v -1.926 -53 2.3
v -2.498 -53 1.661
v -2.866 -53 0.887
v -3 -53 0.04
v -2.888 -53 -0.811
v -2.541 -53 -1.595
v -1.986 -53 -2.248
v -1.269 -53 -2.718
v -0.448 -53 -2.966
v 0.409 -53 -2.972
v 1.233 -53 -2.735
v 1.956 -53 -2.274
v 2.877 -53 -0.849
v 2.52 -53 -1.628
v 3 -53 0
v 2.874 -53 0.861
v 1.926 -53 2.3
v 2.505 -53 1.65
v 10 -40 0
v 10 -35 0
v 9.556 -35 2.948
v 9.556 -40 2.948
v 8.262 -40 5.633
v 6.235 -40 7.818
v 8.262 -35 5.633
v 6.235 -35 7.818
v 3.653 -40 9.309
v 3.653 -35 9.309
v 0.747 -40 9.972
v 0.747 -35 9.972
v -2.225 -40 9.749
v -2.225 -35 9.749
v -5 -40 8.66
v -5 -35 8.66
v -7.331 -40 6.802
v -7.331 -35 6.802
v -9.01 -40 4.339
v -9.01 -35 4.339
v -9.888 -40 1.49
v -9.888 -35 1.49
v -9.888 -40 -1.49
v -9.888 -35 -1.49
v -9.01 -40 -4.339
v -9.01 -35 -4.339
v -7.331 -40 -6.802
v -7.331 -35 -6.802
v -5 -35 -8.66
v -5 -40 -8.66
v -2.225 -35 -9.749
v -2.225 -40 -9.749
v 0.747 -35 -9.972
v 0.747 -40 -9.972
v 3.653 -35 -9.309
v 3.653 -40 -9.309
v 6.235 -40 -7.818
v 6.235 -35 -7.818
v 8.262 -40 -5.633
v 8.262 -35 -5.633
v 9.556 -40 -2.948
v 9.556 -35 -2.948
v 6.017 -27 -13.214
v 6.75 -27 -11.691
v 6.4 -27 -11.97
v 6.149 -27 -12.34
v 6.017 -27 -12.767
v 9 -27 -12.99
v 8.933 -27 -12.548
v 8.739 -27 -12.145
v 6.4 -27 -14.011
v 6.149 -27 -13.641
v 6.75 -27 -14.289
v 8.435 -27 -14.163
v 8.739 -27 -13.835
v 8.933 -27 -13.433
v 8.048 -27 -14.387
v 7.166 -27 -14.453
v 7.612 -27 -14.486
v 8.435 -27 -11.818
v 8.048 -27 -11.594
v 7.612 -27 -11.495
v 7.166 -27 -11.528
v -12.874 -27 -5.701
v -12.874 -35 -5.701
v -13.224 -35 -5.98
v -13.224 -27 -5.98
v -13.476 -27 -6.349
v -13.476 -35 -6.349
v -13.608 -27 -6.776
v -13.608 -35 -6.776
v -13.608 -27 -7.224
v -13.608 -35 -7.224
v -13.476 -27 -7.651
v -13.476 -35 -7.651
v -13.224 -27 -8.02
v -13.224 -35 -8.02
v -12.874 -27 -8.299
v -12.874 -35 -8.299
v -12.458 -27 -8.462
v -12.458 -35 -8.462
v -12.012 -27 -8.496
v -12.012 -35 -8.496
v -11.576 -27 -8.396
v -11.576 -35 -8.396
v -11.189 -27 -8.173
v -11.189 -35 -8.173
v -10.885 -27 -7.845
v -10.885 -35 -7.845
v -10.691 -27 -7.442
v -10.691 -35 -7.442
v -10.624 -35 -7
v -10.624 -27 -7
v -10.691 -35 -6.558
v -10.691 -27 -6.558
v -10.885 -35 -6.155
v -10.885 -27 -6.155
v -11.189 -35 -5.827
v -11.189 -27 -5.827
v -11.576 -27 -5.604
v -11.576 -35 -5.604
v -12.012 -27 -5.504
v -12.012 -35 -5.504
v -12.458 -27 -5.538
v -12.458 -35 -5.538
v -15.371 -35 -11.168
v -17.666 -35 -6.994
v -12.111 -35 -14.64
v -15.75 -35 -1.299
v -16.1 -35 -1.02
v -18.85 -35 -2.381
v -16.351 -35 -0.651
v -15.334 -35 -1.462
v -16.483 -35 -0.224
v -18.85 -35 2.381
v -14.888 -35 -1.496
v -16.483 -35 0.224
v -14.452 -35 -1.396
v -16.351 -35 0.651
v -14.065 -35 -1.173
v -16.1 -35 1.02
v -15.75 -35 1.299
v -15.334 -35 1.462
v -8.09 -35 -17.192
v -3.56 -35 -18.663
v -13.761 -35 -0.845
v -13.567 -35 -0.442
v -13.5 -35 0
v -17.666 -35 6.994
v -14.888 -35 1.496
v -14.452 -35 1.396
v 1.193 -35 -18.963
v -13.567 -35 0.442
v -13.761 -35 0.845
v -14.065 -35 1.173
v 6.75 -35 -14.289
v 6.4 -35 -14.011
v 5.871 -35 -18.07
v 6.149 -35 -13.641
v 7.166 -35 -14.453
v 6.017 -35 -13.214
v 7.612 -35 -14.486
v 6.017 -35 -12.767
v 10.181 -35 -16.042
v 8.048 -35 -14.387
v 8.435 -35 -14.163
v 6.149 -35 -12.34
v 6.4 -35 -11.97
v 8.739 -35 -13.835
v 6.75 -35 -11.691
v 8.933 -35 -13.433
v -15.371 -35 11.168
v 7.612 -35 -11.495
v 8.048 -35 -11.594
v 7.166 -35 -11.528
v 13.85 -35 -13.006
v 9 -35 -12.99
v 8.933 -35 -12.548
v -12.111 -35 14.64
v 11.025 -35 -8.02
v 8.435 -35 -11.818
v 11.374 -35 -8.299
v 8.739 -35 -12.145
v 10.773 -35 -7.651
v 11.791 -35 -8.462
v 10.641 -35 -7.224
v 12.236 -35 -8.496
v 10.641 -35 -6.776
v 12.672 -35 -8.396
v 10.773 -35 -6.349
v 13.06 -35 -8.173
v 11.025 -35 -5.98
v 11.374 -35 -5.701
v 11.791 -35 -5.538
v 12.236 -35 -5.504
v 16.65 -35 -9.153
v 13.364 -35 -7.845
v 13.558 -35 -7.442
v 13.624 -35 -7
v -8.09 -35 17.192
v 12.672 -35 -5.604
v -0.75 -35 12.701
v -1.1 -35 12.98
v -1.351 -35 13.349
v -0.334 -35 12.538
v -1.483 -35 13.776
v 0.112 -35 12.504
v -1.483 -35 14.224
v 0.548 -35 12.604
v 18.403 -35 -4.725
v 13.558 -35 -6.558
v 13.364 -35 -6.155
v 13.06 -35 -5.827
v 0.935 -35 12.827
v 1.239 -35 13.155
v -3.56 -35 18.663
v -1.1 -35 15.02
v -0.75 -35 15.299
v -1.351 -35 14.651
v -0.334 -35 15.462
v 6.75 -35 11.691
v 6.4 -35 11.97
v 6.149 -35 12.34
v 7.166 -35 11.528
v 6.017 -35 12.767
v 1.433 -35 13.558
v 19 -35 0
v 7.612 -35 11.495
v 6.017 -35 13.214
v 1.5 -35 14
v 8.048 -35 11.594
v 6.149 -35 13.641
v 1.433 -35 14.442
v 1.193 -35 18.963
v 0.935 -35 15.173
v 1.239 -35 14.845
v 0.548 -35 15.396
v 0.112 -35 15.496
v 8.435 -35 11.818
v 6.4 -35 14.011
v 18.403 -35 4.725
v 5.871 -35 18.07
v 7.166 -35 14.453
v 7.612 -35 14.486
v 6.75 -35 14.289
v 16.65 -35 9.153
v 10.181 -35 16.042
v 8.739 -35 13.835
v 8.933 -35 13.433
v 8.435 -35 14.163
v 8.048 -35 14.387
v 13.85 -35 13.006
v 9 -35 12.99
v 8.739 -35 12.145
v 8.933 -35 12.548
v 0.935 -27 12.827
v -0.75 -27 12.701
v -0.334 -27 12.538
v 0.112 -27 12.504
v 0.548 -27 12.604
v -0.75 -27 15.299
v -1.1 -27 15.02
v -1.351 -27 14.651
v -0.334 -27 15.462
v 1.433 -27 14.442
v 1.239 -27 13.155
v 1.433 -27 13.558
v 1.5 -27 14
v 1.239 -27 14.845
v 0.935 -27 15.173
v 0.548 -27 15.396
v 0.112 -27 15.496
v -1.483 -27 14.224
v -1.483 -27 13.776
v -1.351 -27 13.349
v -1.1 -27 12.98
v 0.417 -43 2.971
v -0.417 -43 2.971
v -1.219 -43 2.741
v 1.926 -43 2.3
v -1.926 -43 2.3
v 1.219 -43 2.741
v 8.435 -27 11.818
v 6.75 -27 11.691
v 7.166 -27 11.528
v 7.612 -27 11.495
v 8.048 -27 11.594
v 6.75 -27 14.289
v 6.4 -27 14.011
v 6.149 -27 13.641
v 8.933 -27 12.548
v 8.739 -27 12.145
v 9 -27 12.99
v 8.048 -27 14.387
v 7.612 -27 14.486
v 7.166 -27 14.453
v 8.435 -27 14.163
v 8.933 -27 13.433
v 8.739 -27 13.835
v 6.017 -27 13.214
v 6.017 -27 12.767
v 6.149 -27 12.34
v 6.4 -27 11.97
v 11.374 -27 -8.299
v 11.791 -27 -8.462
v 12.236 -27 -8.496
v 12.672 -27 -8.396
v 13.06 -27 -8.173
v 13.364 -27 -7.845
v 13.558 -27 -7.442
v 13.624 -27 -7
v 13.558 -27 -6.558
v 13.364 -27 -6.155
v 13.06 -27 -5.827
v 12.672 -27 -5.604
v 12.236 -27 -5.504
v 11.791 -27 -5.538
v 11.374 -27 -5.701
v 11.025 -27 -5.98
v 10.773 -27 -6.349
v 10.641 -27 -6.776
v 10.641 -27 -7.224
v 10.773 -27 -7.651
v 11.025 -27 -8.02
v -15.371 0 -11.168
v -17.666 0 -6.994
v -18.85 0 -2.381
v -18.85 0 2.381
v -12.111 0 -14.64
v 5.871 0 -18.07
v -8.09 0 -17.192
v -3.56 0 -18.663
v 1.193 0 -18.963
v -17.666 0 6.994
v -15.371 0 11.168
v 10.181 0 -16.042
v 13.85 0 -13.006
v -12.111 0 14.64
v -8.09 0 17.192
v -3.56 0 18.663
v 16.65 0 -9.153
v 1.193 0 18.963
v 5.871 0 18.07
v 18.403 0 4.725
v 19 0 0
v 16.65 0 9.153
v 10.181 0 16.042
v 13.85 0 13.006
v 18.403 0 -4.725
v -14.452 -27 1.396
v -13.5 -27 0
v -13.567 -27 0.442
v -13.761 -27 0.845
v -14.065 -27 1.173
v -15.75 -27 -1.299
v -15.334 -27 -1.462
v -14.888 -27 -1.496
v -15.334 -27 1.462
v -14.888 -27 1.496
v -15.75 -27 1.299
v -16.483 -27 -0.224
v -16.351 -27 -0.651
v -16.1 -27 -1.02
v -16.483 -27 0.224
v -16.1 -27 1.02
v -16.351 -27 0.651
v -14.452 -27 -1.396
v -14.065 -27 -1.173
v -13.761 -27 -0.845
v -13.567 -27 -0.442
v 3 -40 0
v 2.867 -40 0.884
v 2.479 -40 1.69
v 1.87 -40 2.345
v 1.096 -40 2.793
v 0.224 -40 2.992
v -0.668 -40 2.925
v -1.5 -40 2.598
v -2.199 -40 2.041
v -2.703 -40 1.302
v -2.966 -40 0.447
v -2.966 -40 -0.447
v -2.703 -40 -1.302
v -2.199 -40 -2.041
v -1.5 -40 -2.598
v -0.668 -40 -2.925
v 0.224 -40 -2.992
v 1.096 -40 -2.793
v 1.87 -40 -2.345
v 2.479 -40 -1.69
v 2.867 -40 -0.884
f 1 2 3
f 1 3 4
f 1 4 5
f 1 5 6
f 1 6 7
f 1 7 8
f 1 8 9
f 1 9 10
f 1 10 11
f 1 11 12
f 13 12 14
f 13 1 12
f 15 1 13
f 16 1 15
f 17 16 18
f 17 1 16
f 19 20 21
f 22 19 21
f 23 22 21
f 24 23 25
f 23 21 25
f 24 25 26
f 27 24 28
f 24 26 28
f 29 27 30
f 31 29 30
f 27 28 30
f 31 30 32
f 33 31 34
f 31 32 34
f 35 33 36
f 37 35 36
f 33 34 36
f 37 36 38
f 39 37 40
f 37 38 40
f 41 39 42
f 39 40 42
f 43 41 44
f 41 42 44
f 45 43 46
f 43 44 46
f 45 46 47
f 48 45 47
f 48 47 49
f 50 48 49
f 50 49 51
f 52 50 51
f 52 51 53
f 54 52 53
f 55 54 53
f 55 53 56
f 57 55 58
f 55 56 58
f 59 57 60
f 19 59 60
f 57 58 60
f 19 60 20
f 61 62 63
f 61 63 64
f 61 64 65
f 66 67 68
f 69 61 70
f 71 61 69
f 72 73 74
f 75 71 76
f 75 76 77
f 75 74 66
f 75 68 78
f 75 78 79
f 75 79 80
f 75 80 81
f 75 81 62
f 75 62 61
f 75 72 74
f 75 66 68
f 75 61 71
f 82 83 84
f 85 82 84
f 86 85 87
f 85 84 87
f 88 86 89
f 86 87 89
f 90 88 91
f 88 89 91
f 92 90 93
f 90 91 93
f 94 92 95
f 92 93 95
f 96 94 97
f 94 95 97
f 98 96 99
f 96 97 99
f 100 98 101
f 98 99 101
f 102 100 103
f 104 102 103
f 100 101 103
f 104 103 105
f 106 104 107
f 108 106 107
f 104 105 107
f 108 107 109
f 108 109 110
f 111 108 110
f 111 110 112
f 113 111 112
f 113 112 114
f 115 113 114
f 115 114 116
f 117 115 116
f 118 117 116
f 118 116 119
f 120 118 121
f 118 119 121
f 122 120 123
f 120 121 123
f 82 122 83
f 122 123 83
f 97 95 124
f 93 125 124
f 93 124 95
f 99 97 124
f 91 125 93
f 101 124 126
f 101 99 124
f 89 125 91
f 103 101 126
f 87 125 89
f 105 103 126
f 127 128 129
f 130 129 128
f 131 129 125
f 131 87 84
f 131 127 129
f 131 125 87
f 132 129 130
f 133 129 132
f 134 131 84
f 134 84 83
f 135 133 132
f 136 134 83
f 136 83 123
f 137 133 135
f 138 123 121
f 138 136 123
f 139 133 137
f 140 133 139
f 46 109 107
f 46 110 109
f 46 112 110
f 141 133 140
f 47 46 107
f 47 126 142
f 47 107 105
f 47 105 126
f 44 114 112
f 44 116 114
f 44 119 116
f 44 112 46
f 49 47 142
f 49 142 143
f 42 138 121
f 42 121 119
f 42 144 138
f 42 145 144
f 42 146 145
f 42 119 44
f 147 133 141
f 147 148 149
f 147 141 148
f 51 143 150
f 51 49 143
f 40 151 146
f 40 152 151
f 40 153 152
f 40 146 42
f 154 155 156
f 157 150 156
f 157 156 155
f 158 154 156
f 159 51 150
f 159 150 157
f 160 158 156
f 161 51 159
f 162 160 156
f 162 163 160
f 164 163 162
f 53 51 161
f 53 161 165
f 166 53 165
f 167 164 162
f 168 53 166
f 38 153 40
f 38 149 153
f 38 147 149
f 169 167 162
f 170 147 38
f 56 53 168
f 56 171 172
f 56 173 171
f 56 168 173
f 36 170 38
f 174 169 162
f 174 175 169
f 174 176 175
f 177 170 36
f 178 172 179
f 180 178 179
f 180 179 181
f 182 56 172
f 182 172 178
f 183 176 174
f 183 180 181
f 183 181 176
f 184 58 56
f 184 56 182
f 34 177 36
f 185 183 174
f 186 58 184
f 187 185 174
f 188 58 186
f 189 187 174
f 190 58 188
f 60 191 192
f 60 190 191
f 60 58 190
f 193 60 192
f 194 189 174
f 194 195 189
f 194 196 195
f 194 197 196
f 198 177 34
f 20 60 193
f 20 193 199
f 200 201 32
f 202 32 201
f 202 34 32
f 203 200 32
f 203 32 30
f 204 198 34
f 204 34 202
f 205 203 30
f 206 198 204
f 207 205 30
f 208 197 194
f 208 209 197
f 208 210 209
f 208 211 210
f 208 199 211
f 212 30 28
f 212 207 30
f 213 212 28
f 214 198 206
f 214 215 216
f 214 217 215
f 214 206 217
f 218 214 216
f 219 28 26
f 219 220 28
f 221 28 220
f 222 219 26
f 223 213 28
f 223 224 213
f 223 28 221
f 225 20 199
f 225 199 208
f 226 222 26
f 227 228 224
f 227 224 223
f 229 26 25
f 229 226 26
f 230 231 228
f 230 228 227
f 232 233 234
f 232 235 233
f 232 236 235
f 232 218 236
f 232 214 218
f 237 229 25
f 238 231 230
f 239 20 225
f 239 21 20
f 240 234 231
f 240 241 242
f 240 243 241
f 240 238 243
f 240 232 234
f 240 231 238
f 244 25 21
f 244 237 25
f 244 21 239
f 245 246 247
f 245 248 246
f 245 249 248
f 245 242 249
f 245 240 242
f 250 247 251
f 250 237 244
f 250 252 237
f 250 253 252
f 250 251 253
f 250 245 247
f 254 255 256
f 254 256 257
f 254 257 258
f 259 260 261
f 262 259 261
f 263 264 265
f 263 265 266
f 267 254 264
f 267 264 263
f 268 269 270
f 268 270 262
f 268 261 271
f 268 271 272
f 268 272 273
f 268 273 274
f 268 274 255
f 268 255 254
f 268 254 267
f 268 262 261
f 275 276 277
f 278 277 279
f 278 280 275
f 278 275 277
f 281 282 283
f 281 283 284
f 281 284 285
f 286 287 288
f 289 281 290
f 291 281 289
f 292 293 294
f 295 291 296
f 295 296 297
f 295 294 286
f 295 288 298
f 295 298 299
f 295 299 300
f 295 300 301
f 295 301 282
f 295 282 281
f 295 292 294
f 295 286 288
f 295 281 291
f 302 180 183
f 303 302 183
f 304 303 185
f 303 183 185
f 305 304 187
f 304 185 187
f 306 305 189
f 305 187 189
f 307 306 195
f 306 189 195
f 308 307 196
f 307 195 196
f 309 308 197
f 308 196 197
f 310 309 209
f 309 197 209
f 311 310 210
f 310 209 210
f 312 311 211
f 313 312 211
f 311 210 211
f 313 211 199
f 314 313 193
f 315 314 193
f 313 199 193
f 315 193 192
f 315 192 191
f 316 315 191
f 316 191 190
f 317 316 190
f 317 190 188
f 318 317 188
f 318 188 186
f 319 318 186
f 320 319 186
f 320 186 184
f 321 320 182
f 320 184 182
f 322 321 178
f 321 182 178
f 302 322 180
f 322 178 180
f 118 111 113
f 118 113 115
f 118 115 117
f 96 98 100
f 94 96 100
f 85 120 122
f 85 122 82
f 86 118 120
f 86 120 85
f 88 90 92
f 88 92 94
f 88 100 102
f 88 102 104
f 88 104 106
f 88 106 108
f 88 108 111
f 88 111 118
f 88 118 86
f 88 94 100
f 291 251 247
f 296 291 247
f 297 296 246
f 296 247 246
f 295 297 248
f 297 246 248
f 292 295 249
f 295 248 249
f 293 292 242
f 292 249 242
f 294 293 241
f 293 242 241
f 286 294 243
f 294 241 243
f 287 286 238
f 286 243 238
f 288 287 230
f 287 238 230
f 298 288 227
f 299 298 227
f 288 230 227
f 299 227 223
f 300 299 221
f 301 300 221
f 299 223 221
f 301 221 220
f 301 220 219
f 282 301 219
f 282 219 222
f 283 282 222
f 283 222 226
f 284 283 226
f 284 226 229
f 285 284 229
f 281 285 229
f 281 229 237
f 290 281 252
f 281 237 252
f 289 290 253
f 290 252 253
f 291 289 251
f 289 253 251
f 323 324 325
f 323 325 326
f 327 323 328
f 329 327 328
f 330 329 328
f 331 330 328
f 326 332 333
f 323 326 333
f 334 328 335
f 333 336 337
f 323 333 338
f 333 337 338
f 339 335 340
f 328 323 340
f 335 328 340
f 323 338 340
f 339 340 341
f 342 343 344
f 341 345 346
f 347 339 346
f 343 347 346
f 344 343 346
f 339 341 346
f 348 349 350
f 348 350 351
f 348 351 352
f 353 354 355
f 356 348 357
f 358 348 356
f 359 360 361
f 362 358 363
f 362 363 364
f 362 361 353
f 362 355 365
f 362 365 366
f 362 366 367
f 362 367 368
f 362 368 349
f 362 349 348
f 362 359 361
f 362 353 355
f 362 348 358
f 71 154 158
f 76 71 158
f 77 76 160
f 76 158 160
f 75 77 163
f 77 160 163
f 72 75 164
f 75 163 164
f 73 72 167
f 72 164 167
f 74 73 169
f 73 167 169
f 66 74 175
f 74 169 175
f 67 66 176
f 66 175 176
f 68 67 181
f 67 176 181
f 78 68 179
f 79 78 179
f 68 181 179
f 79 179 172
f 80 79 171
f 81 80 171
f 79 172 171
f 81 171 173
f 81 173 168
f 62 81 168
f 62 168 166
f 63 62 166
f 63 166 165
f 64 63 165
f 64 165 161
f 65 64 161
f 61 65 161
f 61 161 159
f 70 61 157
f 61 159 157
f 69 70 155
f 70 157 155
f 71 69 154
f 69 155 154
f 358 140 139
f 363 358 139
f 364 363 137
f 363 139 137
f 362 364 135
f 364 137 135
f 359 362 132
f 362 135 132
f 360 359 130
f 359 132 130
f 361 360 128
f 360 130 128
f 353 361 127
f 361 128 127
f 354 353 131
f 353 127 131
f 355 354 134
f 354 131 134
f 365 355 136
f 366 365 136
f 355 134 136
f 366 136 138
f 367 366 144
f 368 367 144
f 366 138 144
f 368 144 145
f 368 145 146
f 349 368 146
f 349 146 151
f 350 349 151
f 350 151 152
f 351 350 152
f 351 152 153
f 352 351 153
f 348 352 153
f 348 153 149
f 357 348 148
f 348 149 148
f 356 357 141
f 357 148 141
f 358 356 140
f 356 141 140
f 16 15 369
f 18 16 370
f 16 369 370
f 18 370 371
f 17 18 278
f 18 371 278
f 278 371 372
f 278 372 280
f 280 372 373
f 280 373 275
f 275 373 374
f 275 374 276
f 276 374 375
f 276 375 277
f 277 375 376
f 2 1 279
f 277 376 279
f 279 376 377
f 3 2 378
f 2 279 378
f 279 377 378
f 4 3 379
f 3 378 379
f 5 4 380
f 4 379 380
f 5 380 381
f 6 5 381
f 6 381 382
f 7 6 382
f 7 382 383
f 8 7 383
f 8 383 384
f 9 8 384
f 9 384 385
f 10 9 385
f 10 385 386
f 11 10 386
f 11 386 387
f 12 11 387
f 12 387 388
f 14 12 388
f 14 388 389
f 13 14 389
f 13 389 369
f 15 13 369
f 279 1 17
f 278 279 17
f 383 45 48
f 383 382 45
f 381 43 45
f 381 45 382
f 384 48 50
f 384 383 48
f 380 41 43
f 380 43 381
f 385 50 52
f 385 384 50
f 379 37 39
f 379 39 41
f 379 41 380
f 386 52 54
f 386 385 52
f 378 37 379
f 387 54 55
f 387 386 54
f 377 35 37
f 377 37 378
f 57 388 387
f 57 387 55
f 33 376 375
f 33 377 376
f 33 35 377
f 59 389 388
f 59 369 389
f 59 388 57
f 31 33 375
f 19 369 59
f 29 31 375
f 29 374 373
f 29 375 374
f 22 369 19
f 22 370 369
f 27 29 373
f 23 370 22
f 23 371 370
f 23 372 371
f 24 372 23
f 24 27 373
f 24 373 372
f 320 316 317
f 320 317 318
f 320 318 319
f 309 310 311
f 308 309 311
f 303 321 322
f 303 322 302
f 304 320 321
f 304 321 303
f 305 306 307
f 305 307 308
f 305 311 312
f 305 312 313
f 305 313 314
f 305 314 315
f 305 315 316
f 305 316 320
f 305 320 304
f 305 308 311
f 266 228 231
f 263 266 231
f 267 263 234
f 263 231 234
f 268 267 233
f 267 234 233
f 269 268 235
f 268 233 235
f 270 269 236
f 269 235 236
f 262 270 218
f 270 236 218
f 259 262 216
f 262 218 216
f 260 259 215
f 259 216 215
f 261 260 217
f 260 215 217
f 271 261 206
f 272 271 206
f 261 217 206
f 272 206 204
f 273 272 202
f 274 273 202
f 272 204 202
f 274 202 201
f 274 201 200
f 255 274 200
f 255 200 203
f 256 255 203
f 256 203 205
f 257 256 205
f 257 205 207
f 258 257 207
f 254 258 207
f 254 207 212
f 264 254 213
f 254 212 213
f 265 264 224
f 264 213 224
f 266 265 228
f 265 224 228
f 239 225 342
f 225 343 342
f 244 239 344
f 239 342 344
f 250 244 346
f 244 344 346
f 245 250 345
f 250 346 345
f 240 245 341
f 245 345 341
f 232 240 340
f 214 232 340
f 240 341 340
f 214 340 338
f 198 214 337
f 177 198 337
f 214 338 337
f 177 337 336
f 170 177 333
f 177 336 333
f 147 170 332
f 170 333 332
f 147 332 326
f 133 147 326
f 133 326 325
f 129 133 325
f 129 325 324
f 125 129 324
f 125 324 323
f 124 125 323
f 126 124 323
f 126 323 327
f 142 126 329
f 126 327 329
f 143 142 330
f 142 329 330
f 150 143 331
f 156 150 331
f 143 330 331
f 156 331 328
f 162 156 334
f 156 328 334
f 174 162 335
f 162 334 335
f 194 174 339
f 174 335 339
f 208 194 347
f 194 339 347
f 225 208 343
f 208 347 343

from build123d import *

# Parameters (mm, degrees)
SKETCH_R           = 19
PAD_DEPTH          = 34
SKETCH001_R        = 19
PAD001_DEPTH       = 1
SKETCH002_R        = 10
PAD002_DEPTH       = 5
SKETCH003_R        = 3
PAD003_DEPTH       = 13
SKETCH004_W        = 5
SKETCH004_H        = 3
POCKET_DEPTH       = 10
SKETCH005_R        = 1.5
POCKET001_DEPTH    = 8
POLARPATTERN_COUNT = 3


with BuildPart() as part:
    # Sketch → Pad (new body)
    with BuildSketch(Plane.XZ):
        Circle(SKETCH_R)
    extrude(amount=PAD_DEPTH)

    # Sketch001 (on Face3 of Pad) → Pad001 (join)
    with BuildSketch(Plane.XZ.offset(34)):
        Circle(SKETCH001_R)
    extrude(amount=PAD001_DEPTH)

    # Sketch002 (on Face4 of Pad001) → Pad002 (join)
    with BuildSketch(Plane.XZ.offset(35)):
        Circle(SKETCH002_R)
    extrude(amount=PAD002_DEPTH)

    # Sketch003 (on Face6 of Pad002) → Pad003 (join)
    with BuildSketch(Plane.XZ.offset(40)):
        Circle(SKETCH003_R)
    extrude(amount=PAD003_DEPTH)

    # Sketch004 (on Face8 of Pad003) → Pocket (cut)
    with BuildSketch(Plane.XZ.offset(53)):
        with Locations((0, 3.8)):
            Rectangle(SKETCH004_W, SKETCH004_H)
    extrude(amount=-POCKET_DEPTH, mode=Mode.SUBTRACT)

    # Sketch005 (on Face4 of Pad001) → Pocket001 (cut)
    with BuildSketch(Plane.XZ.offset(35)):
        with Locations((0, 14)):
            Circle(SKETCH005_R)
        with Locations((7.5, 12.990381)):
            Circle(SKETCH005_R)
    pocket001 = extrude(amount=-POCKET001_DEPTH, mode=Mode.SUBTRACT)

    # PolarPattern: Pocket001 ×3 about axis
    polarpattern_axis = Axis((0, -35, 0), (0, -1, 0))
    for i in range(1, POLARPATTERN_COUNT):
        add(pocket001.rotate(polarpattern_axis, i * 360 / POLARPATTERN_COUNT), mode=Mode.SUBTRACT)


solid = part.part
